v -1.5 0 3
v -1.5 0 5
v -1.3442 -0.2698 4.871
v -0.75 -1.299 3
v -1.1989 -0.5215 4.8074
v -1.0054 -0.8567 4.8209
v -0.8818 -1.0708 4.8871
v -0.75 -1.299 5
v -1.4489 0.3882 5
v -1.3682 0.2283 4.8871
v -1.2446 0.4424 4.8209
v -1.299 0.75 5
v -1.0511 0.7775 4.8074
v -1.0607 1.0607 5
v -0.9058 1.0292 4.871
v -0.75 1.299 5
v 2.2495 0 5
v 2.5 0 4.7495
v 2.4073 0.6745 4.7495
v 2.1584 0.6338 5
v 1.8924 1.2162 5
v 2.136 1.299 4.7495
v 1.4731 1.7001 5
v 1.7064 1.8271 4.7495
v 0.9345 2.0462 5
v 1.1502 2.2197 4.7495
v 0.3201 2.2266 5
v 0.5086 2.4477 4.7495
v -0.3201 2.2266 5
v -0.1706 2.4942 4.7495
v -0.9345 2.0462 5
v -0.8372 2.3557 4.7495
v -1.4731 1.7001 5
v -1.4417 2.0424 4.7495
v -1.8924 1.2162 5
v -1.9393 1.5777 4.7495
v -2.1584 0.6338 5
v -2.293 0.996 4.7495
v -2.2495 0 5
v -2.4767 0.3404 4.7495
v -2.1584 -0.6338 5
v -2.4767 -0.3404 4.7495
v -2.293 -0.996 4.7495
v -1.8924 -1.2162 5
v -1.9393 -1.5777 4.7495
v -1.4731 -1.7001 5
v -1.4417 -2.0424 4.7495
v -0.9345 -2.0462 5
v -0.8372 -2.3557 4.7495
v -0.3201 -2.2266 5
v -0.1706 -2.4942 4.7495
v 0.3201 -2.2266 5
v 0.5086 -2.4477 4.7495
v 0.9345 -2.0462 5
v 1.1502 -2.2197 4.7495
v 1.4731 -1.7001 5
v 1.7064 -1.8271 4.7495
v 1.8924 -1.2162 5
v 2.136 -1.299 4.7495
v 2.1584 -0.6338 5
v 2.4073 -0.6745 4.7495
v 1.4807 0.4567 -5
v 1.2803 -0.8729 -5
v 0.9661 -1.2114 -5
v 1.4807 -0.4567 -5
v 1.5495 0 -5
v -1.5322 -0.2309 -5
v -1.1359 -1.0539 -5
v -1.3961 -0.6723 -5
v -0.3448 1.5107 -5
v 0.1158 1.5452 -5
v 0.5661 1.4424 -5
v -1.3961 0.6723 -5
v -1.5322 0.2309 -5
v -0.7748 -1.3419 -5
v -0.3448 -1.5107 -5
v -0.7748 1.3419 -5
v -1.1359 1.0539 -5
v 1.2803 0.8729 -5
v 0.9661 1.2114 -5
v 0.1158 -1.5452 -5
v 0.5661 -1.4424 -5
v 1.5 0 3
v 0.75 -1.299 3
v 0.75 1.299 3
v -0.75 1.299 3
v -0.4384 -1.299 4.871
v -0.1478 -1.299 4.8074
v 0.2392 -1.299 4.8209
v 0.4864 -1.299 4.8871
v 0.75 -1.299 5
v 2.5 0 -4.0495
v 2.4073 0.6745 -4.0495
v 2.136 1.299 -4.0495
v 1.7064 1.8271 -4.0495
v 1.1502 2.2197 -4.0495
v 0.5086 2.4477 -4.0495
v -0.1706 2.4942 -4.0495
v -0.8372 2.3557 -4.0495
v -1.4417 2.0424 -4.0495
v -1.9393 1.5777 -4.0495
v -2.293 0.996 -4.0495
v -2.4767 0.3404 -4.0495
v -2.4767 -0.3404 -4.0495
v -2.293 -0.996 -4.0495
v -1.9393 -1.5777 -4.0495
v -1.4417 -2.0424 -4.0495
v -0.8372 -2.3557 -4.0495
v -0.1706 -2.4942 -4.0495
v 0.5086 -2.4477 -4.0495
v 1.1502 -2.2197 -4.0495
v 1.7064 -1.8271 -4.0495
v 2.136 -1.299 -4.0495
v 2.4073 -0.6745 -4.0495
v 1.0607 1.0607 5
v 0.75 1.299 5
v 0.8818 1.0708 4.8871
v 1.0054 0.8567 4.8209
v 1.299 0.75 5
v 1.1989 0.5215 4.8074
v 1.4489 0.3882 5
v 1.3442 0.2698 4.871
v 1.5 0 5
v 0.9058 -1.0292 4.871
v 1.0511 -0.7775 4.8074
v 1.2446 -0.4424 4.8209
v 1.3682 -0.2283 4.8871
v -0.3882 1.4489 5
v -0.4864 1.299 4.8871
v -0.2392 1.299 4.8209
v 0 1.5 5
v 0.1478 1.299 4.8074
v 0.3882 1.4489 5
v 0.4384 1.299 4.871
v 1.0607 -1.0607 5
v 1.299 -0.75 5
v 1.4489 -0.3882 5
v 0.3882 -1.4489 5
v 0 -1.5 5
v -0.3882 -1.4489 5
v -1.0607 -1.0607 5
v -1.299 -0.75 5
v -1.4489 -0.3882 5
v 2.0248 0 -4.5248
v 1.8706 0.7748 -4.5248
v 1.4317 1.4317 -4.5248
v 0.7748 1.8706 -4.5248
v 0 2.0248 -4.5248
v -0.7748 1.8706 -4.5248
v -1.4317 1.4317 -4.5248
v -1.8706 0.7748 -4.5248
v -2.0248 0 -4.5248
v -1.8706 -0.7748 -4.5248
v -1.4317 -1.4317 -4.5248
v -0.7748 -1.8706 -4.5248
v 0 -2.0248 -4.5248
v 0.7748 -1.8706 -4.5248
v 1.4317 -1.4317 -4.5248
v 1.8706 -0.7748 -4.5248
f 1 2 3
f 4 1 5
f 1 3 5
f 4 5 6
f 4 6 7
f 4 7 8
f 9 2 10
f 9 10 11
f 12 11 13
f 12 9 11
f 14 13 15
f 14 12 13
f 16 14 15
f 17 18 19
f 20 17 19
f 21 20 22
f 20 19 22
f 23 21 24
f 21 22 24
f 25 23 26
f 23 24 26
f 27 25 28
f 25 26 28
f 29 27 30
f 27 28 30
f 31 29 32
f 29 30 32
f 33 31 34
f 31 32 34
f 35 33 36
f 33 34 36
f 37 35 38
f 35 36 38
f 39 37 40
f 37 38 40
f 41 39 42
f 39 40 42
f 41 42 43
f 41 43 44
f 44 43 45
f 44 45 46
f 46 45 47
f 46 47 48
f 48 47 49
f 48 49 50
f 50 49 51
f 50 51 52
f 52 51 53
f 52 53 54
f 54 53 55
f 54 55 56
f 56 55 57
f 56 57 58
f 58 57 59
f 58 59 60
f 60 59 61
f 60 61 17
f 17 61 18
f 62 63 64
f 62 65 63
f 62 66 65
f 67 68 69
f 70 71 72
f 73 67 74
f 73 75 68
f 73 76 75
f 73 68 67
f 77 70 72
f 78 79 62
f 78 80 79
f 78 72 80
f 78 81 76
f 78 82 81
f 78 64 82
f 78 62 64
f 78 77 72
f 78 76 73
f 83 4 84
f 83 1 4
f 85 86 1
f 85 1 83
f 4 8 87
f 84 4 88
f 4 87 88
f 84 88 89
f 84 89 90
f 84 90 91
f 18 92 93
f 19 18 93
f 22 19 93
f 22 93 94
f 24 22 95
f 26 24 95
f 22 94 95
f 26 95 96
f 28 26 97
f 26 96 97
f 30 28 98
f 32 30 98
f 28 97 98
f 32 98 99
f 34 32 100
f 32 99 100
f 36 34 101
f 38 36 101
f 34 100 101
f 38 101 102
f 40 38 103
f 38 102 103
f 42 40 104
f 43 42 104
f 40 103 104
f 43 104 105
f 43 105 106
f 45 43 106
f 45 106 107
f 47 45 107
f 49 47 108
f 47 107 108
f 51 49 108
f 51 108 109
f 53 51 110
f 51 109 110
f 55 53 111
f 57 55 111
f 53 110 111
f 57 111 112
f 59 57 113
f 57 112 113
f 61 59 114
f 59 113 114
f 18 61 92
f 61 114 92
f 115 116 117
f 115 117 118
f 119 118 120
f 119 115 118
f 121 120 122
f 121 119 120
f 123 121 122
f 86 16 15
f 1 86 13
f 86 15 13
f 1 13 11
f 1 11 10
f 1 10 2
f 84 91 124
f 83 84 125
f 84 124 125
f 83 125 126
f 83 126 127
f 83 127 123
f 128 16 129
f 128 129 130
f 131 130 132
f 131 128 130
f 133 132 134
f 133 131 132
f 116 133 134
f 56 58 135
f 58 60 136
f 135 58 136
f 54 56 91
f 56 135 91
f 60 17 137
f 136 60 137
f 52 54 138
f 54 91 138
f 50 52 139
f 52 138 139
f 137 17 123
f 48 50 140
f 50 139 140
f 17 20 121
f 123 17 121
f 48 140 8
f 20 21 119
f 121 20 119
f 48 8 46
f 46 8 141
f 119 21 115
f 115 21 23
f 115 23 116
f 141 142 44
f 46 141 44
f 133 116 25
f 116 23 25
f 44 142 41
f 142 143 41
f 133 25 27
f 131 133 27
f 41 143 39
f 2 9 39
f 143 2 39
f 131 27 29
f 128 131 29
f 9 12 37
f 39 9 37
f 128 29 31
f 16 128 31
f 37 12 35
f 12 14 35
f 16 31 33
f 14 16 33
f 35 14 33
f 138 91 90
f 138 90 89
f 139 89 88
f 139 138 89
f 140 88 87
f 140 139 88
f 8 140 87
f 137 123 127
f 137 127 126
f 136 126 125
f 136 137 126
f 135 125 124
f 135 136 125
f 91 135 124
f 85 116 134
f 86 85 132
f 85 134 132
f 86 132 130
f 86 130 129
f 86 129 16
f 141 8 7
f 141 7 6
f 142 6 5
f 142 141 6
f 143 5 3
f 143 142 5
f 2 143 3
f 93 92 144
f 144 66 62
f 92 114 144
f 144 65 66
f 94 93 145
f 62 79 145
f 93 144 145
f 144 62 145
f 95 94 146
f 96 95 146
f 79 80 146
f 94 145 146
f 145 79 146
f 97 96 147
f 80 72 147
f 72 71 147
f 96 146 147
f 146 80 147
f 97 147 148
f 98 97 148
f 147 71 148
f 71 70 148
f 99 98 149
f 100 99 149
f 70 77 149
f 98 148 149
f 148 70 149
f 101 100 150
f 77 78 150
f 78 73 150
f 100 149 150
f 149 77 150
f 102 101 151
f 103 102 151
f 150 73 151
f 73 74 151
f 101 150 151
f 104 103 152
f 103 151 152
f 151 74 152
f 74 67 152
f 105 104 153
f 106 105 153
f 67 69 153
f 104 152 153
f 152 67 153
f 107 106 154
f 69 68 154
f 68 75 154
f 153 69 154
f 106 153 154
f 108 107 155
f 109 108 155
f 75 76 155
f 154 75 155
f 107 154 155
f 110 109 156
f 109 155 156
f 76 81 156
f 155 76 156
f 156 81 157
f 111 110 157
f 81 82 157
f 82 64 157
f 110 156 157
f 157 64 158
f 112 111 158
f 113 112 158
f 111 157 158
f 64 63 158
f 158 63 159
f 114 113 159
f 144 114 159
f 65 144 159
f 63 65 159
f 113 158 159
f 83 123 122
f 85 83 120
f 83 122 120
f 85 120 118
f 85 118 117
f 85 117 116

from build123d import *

# Parameters (mm, degrees)
SKETCH1_W          = 2.5
SKETCH1_H          = 10
CUT_EXTRUDE1_DEPTH = 2
CHAMFER1_SIZE      = 0.2505
CHAMFER2_SIZE      = 0.9505


with BuildPart() as part:
    # Sketch1 → Revolve1 (revolve)
    with BuildSketch(Plane(origin=(0, 0, 0), x_dir=(1, 0, 0), z_dir=(0, 1, 0))):
        with Locations((1.25, 0)):
            Rectangle(SKETCH1_W, SKETCH1_H)
    revolve(axis=Axis((0, 0, -5), (0, 0, 1)))

    # Sketch2 → Cut-Extrude1 (cut)
    with BuildSketch(Plane.XY.offset(5)):
        Polygon((-0.75, -1.299038106), (0.75, -1.299038106), (1.5, 0), (0.75, 1.299038106), (-0.75, 1.299038106), (-1.5, 0), align=None)
    extrude(amount=-CUT_EXTRUDE1_DEPTH, mode=Mode.SUBTRACT)

    # Chamfer1
    chamfer1_edges = [part.edges().sort_by_distance(p)[0] for p in [
        (-2.5, 0, 5),
    ]]
    chamfer(chamfer1_edges, length=CHAMFER1_SIZE)

    # Chamfer2
    chamfer2_edges = [part.edges().sort_by_distance(p)[0] for p in [
        (-2.5, 0, -5),
    ]]
    chamfer(chamfer2_edges, length=CHAMFER2_SIZE)

    # Sketch3 → Cut-Revolve1 (revolve, cut)
    with BuildSketch(Plane(origin=(0, 0, 0), x_dir=(1, 0, 0), z_dir=(0, 1, 0))):
        Polygon((0, -3.5), (-1.5, -5), (0, -5), align=None)
    revolve(axis=Axis((0, 0, 3.5), (0, 0, -1)), mode=Mode.SUBTRACT)


solid = part.part
